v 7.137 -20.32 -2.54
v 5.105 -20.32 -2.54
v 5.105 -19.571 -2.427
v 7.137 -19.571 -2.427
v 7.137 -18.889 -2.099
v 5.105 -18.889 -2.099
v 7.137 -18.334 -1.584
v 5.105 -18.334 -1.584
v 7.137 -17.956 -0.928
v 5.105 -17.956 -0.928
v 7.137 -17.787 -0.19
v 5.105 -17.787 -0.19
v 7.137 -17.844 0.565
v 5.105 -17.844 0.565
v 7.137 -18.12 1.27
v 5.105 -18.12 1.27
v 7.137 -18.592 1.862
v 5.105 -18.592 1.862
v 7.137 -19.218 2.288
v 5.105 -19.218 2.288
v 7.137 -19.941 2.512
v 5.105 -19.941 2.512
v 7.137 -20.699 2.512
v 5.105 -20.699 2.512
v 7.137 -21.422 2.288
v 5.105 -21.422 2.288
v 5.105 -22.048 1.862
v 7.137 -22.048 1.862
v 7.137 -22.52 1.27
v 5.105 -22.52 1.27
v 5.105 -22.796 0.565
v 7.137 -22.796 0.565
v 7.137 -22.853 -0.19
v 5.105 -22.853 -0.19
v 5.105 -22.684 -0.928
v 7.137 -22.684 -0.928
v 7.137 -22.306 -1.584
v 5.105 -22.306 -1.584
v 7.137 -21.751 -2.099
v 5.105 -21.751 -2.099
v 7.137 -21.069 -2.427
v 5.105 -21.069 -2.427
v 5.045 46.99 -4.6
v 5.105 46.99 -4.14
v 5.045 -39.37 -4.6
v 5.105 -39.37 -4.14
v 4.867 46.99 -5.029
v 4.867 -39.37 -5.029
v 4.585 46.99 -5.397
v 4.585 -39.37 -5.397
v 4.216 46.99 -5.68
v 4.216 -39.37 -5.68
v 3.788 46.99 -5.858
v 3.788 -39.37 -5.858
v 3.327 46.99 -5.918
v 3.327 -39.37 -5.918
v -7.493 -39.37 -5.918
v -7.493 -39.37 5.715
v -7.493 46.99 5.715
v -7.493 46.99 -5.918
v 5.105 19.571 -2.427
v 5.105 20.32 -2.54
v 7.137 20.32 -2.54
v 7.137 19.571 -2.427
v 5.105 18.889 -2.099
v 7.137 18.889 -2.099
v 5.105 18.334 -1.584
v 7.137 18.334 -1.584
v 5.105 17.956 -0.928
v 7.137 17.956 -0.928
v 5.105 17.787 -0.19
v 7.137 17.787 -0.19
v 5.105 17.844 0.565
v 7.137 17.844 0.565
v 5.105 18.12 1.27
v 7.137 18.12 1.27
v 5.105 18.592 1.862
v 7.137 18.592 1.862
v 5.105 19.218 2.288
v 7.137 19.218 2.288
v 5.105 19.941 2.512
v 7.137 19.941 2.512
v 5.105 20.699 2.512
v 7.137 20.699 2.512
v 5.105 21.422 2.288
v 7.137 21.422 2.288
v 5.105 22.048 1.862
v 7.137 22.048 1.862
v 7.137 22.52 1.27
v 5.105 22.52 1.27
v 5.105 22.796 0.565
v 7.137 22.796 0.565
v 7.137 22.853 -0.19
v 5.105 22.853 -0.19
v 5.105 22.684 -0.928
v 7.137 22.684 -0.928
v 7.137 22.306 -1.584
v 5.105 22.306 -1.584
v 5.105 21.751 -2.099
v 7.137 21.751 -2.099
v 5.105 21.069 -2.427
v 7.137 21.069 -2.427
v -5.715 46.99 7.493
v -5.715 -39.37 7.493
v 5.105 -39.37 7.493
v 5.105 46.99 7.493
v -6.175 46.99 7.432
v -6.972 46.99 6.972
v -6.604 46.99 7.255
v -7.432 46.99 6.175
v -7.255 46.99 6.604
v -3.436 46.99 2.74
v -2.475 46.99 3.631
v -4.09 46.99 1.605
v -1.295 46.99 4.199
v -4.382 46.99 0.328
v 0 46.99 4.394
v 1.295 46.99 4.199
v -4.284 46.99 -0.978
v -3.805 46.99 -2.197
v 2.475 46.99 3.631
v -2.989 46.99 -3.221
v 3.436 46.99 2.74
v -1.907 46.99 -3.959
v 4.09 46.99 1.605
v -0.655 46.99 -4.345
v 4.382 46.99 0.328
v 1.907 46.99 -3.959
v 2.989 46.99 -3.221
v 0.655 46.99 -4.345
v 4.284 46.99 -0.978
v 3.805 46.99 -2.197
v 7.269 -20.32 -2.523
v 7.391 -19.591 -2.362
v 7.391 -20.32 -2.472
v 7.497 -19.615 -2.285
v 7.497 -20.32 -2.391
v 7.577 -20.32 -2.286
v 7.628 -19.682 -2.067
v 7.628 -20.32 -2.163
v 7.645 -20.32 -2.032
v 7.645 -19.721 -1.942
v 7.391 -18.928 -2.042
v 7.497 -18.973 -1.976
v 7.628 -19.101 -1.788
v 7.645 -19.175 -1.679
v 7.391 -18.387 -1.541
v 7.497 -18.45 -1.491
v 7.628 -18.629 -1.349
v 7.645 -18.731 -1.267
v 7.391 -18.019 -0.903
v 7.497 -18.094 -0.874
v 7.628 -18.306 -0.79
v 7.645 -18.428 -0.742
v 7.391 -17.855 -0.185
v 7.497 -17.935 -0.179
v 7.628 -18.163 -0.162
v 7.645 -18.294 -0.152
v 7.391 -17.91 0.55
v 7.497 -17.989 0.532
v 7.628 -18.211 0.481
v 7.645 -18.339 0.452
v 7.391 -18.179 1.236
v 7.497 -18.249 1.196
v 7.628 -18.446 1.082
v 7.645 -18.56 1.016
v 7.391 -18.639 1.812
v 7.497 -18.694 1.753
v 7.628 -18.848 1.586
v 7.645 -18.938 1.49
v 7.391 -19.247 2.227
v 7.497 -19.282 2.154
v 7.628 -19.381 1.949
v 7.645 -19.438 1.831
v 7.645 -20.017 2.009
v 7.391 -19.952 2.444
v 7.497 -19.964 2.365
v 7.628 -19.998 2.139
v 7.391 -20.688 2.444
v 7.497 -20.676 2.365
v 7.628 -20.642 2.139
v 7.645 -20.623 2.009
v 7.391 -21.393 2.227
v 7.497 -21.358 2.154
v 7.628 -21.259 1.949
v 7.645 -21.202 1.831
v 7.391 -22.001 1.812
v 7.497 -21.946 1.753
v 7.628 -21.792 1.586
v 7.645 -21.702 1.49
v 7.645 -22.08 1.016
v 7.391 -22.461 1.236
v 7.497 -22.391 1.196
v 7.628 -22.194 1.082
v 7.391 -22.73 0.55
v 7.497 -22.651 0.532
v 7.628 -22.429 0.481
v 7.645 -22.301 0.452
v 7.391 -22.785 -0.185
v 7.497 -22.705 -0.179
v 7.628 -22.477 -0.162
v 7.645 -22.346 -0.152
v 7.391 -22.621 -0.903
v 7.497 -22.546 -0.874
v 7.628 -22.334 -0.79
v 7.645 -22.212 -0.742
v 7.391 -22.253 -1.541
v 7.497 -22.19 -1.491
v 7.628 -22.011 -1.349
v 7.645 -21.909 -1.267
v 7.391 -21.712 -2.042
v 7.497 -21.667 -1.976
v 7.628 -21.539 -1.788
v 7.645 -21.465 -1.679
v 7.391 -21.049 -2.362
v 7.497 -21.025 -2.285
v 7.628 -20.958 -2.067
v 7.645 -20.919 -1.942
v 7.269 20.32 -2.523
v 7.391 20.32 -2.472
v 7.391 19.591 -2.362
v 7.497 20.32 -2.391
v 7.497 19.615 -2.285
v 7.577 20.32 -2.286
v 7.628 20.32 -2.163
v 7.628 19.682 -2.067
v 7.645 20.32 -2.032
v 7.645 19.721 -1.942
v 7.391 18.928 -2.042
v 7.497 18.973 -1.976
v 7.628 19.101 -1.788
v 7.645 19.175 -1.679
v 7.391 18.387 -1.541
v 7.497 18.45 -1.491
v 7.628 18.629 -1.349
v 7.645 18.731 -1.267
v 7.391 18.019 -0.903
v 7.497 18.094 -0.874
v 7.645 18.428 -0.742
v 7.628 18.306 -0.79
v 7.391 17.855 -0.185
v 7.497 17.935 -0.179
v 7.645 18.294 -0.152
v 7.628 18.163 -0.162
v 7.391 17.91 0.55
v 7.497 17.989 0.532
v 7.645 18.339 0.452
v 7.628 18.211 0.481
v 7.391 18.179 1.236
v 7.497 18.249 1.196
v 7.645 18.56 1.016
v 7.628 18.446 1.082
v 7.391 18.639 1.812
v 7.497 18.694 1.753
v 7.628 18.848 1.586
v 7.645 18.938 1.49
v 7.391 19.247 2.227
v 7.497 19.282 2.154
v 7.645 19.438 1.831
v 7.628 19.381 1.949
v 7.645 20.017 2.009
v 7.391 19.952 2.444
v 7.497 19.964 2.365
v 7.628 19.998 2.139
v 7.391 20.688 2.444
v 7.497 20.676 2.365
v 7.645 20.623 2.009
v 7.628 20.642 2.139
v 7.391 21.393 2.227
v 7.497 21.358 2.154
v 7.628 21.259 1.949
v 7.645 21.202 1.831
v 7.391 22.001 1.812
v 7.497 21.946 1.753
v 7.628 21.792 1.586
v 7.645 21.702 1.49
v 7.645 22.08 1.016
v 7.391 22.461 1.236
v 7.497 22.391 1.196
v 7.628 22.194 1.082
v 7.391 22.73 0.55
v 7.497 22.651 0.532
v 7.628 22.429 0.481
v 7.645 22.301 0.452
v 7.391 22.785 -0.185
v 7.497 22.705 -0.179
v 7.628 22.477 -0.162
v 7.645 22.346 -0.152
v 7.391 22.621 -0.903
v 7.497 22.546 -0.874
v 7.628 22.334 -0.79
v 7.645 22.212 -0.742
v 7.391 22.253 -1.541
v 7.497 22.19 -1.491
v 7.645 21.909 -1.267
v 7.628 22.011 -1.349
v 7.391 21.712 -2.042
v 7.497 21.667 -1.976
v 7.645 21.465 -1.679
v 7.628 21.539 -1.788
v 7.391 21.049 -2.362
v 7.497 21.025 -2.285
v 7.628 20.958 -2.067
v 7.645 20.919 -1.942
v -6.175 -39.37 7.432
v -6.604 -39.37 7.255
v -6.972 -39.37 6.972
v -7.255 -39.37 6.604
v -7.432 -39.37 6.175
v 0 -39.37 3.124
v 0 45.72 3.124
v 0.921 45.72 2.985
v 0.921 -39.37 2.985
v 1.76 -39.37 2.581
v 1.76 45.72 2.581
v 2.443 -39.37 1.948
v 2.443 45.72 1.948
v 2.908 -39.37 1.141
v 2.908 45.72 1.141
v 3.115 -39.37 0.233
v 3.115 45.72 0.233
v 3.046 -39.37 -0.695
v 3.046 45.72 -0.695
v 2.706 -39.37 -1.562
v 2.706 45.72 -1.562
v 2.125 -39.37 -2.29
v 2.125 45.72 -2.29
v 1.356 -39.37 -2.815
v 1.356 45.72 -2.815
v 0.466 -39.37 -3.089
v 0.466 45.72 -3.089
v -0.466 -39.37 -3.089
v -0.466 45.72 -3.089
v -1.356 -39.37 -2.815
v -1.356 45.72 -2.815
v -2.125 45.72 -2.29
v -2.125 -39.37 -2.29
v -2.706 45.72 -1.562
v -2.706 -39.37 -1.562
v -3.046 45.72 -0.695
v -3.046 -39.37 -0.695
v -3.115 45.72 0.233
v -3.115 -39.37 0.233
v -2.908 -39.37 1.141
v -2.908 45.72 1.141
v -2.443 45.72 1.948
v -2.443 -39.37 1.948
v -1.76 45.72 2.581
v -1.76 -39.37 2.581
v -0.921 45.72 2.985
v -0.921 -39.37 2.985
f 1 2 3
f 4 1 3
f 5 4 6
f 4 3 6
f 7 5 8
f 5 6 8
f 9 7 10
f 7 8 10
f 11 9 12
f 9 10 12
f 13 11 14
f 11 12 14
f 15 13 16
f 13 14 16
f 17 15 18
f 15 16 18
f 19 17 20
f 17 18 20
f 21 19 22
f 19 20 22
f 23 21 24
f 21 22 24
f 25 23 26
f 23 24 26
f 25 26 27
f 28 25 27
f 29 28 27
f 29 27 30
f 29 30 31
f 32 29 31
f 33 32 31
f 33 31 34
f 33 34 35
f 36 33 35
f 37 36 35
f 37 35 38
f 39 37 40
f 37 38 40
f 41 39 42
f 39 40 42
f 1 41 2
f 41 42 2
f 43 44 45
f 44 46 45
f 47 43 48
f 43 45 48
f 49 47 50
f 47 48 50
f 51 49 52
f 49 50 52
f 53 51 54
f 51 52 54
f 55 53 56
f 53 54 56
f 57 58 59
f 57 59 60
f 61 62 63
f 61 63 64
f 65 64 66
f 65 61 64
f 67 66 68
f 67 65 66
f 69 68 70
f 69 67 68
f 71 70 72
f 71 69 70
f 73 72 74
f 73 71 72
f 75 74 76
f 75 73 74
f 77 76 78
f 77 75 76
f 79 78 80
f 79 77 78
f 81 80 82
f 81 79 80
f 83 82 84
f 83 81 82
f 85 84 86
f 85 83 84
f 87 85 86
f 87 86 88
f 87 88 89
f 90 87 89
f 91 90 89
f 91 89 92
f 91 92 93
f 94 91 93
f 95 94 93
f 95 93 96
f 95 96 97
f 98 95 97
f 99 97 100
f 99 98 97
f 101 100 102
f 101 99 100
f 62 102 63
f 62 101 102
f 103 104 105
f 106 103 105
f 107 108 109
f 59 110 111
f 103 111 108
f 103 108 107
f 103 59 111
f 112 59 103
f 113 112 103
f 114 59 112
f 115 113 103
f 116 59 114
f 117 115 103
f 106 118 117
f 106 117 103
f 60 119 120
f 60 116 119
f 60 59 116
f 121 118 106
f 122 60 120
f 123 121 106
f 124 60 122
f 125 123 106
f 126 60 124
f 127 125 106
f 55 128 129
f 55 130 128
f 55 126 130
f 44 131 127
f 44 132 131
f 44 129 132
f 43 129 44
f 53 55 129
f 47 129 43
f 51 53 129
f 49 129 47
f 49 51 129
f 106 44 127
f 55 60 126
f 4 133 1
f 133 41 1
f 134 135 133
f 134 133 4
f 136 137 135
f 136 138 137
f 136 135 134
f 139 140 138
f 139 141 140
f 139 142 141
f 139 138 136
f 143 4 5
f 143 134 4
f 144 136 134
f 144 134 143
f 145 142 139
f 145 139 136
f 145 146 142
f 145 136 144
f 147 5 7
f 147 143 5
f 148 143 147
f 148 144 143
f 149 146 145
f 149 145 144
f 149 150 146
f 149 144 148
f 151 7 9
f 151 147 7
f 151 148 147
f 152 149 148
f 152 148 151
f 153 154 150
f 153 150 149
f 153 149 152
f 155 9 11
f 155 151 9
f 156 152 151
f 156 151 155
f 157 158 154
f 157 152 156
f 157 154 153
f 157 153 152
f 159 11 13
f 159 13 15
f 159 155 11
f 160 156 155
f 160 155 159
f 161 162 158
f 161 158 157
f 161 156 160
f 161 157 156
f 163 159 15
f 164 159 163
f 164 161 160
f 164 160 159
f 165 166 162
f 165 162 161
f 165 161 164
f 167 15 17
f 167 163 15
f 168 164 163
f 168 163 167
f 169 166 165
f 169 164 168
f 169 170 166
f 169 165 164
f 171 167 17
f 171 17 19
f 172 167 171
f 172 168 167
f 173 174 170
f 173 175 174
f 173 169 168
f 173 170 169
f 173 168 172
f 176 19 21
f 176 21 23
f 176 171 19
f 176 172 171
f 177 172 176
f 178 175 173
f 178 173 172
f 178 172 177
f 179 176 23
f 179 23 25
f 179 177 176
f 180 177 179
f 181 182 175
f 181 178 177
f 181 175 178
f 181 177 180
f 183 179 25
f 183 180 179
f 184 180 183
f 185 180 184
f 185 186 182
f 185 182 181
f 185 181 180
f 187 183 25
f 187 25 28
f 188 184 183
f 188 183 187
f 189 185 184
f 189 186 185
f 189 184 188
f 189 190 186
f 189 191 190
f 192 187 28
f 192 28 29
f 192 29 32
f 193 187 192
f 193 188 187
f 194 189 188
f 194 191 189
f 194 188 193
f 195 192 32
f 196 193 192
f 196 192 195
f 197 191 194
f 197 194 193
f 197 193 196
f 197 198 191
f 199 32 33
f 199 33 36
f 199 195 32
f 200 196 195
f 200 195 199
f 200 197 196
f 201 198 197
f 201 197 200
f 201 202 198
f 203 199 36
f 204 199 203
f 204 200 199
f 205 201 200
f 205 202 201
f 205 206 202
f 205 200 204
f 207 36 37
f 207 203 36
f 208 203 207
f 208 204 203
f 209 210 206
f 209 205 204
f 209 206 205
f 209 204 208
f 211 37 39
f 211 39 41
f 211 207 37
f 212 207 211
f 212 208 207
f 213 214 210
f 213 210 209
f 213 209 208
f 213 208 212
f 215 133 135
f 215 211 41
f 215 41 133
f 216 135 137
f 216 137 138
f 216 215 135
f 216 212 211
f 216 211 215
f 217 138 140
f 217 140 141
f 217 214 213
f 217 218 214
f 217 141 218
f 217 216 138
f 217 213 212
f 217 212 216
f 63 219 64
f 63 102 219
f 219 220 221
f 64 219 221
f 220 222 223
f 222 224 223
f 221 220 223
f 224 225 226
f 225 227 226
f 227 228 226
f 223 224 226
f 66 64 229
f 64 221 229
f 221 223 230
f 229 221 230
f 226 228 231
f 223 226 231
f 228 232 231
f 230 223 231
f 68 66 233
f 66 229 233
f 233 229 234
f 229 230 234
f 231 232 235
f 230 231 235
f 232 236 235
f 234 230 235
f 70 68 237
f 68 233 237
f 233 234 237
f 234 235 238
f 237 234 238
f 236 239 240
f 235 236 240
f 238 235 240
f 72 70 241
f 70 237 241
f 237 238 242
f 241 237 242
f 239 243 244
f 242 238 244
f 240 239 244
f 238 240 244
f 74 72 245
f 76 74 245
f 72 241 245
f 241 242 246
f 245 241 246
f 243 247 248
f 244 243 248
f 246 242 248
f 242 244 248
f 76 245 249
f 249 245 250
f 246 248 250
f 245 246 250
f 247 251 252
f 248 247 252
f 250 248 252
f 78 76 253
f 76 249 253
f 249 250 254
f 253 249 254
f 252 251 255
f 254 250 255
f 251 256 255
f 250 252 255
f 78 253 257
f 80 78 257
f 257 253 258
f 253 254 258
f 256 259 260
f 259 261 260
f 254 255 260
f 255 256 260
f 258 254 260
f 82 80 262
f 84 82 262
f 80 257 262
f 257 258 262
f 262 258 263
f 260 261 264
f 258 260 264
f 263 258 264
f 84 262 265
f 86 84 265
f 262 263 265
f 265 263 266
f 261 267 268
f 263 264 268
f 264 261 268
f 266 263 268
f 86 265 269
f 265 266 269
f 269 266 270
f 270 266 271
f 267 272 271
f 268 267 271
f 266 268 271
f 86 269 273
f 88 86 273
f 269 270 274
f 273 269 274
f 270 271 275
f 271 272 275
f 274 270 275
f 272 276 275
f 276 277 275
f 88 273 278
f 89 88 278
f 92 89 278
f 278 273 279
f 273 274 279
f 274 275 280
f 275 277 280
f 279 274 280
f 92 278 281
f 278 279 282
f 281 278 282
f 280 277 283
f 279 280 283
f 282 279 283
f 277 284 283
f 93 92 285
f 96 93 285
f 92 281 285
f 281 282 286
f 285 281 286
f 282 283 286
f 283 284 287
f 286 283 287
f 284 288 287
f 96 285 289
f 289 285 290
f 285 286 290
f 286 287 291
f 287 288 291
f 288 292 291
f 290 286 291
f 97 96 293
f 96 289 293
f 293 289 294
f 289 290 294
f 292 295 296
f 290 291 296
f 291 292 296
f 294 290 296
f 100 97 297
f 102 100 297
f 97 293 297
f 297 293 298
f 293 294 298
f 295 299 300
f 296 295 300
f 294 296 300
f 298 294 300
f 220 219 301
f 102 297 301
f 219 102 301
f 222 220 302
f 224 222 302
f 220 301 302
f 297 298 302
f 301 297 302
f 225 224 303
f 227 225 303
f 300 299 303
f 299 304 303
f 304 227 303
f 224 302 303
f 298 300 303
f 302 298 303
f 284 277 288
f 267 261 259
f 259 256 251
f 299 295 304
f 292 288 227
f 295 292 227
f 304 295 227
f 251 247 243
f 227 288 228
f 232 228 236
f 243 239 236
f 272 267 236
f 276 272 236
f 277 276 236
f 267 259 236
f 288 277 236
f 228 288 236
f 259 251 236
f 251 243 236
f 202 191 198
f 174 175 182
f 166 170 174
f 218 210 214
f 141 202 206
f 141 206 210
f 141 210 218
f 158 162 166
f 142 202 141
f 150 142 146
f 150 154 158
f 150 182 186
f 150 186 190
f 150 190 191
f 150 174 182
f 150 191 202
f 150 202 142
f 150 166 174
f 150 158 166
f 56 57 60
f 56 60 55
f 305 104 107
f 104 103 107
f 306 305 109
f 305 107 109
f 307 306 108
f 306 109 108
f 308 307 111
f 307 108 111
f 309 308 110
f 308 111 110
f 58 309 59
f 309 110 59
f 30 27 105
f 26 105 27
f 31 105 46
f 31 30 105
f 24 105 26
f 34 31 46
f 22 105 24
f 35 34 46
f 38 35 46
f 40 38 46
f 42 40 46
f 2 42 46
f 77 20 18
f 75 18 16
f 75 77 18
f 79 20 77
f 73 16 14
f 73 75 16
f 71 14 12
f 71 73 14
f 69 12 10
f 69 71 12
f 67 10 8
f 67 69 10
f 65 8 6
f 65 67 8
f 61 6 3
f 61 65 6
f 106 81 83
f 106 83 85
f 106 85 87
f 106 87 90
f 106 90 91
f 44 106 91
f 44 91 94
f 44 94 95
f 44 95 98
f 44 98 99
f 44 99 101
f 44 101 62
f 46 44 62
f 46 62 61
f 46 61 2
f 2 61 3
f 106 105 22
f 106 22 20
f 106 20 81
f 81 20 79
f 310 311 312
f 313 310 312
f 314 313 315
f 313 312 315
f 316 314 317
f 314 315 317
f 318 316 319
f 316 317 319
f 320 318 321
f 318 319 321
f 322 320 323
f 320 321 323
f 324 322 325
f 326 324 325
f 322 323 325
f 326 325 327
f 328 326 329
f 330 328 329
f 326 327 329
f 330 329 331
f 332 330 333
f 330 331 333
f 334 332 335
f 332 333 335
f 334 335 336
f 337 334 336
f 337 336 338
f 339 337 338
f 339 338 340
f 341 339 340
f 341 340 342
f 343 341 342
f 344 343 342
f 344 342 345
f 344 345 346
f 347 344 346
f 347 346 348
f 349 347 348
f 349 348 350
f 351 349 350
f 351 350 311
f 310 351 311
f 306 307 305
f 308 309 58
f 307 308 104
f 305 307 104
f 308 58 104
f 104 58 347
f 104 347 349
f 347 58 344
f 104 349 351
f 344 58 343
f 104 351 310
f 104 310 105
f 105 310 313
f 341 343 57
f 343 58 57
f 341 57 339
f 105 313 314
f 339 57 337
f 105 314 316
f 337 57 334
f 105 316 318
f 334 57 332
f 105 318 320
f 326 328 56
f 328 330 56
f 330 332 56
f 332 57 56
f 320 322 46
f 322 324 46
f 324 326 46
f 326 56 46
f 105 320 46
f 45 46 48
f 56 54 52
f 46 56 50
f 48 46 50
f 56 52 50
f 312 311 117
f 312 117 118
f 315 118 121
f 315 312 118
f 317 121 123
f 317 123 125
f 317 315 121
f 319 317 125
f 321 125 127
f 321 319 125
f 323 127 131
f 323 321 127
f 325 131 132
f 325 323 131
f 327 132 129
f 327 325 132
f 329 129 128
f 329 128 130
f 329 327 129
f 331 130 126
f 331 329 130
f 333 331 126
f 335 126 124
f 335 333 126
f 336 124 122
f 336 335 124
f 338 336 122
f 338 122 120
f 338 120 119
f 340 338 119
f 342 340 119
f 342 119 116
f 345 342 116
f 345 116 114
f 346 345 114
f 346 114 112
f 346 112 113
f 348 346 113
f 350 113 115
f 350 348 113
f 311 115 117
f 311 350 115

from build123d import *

# Parameters (mm, degrees)
SKETCH1_W                = 12.5984
SKETCH1_H                = 13.4112
BOSS_EXTRUDE1_DEPTH      = 46.99
BOSS_EXTRUDE1_DEPTH_BACK = 39.37
SKETCH2_R                = 3.1242
CUT_EXTRUDE1_DEPTH       = 87.36
SKETCH4_R                = 2.54
BOSS_EXTRUDE2_DEPTH      = 2.54
FILLET2_R                = 0.508
FILLET2_OF_MIRROR1_R     = 0.508
FILLET1_R                = 1.778
CHAMFER1_SIZE            = 1.27


with BuildPart() as part:
    # Sketch1 → Boss-Extrude1 (new body, two sides)
    with BuildSketch(Plane(origin=(0, 0, 0), x_dir=(1, 0, 0), z_dir=(0, 1, 0))) as boss_extrude1_sk:
        with Locations((-1.1938, -0.7874)):
            Rectangle(SKETCH1_W, SKETCH1_H)
    extrude(amount=BOSS_EXTRUDE1_DEPTH)
    extrude(boss_extrude1_sk.sketch, amount=-BOSS_EXTRUDE1_DEPTH_BACK)

    # Sketch2 → Cut-Extrude1 (cut, through all)
    with BuildSketch(Plane(origin=(0, 46.99, 0), x_dir=(1, 0, 0), z_dir=(0, 1, 0))):
        with Locations(Location((0, 0, 0), (0, 0, 270))):  # turned: the seam where the file's is
            Circle(SKETCH2_R)
    extrude(amount=-CUT_EXTRUDE1_DEPTH, mode=Mode.SUBTRACT)

    # Sketch4 → Boss-Extrude2 (add)
    with BuildSketch(Plane(origin=(5.1054, 0, 0), x_dir=(0, 0, -1), z_dir=(1, 0, 0))):
        with Locations((0, -20.32)):
            Circle(SKETCH4_R)
    boss_extrude2 = extrude(amount=BOSS_EXTRUDE2_DEPTH)

    # Fillet2
    fillet2_edges = [part.edges().sort_by_distance(p)[0] for p in [
        (7.6454, -20.32, 2.54),
    ]]
    fillet(fillet2_edges, radius=FILLET2_R)

    # Mirror1: Boss-Extrude2 across plane
    add(boss_extrude2.mirror(Plane.ZX))

    # Fillet2 of Mirror1
    fillet2_of_mirror1_edges = [part.edges().sort_by_distance(p)[0] for p in [
        (7.6454, 20.32, 2.54),
    ]]
    fillet(fillet2_of_mirror1_edges, radius=FILLET2_OF_MIRROR1_R)

    # Fillet1
    fillet1_edges = [part.edges().sort_by_distance(p)[0] for p in [
        (5.1054, 3.81, -5.9182),
        (-7.493, 3.81, 7.493),
    ]]
    fillet(fillet1_edges, radius=FILLET1_R)

    # Chamfer1
    chamfer1_edges = [part.edges().sort_by_distance(p)[0] for p in [
        (0, 46.99, -3.1242),
    ]]
    chamfer(chamfer1_edges, length=CHAMFER1_SIZE)


solid = part.part
